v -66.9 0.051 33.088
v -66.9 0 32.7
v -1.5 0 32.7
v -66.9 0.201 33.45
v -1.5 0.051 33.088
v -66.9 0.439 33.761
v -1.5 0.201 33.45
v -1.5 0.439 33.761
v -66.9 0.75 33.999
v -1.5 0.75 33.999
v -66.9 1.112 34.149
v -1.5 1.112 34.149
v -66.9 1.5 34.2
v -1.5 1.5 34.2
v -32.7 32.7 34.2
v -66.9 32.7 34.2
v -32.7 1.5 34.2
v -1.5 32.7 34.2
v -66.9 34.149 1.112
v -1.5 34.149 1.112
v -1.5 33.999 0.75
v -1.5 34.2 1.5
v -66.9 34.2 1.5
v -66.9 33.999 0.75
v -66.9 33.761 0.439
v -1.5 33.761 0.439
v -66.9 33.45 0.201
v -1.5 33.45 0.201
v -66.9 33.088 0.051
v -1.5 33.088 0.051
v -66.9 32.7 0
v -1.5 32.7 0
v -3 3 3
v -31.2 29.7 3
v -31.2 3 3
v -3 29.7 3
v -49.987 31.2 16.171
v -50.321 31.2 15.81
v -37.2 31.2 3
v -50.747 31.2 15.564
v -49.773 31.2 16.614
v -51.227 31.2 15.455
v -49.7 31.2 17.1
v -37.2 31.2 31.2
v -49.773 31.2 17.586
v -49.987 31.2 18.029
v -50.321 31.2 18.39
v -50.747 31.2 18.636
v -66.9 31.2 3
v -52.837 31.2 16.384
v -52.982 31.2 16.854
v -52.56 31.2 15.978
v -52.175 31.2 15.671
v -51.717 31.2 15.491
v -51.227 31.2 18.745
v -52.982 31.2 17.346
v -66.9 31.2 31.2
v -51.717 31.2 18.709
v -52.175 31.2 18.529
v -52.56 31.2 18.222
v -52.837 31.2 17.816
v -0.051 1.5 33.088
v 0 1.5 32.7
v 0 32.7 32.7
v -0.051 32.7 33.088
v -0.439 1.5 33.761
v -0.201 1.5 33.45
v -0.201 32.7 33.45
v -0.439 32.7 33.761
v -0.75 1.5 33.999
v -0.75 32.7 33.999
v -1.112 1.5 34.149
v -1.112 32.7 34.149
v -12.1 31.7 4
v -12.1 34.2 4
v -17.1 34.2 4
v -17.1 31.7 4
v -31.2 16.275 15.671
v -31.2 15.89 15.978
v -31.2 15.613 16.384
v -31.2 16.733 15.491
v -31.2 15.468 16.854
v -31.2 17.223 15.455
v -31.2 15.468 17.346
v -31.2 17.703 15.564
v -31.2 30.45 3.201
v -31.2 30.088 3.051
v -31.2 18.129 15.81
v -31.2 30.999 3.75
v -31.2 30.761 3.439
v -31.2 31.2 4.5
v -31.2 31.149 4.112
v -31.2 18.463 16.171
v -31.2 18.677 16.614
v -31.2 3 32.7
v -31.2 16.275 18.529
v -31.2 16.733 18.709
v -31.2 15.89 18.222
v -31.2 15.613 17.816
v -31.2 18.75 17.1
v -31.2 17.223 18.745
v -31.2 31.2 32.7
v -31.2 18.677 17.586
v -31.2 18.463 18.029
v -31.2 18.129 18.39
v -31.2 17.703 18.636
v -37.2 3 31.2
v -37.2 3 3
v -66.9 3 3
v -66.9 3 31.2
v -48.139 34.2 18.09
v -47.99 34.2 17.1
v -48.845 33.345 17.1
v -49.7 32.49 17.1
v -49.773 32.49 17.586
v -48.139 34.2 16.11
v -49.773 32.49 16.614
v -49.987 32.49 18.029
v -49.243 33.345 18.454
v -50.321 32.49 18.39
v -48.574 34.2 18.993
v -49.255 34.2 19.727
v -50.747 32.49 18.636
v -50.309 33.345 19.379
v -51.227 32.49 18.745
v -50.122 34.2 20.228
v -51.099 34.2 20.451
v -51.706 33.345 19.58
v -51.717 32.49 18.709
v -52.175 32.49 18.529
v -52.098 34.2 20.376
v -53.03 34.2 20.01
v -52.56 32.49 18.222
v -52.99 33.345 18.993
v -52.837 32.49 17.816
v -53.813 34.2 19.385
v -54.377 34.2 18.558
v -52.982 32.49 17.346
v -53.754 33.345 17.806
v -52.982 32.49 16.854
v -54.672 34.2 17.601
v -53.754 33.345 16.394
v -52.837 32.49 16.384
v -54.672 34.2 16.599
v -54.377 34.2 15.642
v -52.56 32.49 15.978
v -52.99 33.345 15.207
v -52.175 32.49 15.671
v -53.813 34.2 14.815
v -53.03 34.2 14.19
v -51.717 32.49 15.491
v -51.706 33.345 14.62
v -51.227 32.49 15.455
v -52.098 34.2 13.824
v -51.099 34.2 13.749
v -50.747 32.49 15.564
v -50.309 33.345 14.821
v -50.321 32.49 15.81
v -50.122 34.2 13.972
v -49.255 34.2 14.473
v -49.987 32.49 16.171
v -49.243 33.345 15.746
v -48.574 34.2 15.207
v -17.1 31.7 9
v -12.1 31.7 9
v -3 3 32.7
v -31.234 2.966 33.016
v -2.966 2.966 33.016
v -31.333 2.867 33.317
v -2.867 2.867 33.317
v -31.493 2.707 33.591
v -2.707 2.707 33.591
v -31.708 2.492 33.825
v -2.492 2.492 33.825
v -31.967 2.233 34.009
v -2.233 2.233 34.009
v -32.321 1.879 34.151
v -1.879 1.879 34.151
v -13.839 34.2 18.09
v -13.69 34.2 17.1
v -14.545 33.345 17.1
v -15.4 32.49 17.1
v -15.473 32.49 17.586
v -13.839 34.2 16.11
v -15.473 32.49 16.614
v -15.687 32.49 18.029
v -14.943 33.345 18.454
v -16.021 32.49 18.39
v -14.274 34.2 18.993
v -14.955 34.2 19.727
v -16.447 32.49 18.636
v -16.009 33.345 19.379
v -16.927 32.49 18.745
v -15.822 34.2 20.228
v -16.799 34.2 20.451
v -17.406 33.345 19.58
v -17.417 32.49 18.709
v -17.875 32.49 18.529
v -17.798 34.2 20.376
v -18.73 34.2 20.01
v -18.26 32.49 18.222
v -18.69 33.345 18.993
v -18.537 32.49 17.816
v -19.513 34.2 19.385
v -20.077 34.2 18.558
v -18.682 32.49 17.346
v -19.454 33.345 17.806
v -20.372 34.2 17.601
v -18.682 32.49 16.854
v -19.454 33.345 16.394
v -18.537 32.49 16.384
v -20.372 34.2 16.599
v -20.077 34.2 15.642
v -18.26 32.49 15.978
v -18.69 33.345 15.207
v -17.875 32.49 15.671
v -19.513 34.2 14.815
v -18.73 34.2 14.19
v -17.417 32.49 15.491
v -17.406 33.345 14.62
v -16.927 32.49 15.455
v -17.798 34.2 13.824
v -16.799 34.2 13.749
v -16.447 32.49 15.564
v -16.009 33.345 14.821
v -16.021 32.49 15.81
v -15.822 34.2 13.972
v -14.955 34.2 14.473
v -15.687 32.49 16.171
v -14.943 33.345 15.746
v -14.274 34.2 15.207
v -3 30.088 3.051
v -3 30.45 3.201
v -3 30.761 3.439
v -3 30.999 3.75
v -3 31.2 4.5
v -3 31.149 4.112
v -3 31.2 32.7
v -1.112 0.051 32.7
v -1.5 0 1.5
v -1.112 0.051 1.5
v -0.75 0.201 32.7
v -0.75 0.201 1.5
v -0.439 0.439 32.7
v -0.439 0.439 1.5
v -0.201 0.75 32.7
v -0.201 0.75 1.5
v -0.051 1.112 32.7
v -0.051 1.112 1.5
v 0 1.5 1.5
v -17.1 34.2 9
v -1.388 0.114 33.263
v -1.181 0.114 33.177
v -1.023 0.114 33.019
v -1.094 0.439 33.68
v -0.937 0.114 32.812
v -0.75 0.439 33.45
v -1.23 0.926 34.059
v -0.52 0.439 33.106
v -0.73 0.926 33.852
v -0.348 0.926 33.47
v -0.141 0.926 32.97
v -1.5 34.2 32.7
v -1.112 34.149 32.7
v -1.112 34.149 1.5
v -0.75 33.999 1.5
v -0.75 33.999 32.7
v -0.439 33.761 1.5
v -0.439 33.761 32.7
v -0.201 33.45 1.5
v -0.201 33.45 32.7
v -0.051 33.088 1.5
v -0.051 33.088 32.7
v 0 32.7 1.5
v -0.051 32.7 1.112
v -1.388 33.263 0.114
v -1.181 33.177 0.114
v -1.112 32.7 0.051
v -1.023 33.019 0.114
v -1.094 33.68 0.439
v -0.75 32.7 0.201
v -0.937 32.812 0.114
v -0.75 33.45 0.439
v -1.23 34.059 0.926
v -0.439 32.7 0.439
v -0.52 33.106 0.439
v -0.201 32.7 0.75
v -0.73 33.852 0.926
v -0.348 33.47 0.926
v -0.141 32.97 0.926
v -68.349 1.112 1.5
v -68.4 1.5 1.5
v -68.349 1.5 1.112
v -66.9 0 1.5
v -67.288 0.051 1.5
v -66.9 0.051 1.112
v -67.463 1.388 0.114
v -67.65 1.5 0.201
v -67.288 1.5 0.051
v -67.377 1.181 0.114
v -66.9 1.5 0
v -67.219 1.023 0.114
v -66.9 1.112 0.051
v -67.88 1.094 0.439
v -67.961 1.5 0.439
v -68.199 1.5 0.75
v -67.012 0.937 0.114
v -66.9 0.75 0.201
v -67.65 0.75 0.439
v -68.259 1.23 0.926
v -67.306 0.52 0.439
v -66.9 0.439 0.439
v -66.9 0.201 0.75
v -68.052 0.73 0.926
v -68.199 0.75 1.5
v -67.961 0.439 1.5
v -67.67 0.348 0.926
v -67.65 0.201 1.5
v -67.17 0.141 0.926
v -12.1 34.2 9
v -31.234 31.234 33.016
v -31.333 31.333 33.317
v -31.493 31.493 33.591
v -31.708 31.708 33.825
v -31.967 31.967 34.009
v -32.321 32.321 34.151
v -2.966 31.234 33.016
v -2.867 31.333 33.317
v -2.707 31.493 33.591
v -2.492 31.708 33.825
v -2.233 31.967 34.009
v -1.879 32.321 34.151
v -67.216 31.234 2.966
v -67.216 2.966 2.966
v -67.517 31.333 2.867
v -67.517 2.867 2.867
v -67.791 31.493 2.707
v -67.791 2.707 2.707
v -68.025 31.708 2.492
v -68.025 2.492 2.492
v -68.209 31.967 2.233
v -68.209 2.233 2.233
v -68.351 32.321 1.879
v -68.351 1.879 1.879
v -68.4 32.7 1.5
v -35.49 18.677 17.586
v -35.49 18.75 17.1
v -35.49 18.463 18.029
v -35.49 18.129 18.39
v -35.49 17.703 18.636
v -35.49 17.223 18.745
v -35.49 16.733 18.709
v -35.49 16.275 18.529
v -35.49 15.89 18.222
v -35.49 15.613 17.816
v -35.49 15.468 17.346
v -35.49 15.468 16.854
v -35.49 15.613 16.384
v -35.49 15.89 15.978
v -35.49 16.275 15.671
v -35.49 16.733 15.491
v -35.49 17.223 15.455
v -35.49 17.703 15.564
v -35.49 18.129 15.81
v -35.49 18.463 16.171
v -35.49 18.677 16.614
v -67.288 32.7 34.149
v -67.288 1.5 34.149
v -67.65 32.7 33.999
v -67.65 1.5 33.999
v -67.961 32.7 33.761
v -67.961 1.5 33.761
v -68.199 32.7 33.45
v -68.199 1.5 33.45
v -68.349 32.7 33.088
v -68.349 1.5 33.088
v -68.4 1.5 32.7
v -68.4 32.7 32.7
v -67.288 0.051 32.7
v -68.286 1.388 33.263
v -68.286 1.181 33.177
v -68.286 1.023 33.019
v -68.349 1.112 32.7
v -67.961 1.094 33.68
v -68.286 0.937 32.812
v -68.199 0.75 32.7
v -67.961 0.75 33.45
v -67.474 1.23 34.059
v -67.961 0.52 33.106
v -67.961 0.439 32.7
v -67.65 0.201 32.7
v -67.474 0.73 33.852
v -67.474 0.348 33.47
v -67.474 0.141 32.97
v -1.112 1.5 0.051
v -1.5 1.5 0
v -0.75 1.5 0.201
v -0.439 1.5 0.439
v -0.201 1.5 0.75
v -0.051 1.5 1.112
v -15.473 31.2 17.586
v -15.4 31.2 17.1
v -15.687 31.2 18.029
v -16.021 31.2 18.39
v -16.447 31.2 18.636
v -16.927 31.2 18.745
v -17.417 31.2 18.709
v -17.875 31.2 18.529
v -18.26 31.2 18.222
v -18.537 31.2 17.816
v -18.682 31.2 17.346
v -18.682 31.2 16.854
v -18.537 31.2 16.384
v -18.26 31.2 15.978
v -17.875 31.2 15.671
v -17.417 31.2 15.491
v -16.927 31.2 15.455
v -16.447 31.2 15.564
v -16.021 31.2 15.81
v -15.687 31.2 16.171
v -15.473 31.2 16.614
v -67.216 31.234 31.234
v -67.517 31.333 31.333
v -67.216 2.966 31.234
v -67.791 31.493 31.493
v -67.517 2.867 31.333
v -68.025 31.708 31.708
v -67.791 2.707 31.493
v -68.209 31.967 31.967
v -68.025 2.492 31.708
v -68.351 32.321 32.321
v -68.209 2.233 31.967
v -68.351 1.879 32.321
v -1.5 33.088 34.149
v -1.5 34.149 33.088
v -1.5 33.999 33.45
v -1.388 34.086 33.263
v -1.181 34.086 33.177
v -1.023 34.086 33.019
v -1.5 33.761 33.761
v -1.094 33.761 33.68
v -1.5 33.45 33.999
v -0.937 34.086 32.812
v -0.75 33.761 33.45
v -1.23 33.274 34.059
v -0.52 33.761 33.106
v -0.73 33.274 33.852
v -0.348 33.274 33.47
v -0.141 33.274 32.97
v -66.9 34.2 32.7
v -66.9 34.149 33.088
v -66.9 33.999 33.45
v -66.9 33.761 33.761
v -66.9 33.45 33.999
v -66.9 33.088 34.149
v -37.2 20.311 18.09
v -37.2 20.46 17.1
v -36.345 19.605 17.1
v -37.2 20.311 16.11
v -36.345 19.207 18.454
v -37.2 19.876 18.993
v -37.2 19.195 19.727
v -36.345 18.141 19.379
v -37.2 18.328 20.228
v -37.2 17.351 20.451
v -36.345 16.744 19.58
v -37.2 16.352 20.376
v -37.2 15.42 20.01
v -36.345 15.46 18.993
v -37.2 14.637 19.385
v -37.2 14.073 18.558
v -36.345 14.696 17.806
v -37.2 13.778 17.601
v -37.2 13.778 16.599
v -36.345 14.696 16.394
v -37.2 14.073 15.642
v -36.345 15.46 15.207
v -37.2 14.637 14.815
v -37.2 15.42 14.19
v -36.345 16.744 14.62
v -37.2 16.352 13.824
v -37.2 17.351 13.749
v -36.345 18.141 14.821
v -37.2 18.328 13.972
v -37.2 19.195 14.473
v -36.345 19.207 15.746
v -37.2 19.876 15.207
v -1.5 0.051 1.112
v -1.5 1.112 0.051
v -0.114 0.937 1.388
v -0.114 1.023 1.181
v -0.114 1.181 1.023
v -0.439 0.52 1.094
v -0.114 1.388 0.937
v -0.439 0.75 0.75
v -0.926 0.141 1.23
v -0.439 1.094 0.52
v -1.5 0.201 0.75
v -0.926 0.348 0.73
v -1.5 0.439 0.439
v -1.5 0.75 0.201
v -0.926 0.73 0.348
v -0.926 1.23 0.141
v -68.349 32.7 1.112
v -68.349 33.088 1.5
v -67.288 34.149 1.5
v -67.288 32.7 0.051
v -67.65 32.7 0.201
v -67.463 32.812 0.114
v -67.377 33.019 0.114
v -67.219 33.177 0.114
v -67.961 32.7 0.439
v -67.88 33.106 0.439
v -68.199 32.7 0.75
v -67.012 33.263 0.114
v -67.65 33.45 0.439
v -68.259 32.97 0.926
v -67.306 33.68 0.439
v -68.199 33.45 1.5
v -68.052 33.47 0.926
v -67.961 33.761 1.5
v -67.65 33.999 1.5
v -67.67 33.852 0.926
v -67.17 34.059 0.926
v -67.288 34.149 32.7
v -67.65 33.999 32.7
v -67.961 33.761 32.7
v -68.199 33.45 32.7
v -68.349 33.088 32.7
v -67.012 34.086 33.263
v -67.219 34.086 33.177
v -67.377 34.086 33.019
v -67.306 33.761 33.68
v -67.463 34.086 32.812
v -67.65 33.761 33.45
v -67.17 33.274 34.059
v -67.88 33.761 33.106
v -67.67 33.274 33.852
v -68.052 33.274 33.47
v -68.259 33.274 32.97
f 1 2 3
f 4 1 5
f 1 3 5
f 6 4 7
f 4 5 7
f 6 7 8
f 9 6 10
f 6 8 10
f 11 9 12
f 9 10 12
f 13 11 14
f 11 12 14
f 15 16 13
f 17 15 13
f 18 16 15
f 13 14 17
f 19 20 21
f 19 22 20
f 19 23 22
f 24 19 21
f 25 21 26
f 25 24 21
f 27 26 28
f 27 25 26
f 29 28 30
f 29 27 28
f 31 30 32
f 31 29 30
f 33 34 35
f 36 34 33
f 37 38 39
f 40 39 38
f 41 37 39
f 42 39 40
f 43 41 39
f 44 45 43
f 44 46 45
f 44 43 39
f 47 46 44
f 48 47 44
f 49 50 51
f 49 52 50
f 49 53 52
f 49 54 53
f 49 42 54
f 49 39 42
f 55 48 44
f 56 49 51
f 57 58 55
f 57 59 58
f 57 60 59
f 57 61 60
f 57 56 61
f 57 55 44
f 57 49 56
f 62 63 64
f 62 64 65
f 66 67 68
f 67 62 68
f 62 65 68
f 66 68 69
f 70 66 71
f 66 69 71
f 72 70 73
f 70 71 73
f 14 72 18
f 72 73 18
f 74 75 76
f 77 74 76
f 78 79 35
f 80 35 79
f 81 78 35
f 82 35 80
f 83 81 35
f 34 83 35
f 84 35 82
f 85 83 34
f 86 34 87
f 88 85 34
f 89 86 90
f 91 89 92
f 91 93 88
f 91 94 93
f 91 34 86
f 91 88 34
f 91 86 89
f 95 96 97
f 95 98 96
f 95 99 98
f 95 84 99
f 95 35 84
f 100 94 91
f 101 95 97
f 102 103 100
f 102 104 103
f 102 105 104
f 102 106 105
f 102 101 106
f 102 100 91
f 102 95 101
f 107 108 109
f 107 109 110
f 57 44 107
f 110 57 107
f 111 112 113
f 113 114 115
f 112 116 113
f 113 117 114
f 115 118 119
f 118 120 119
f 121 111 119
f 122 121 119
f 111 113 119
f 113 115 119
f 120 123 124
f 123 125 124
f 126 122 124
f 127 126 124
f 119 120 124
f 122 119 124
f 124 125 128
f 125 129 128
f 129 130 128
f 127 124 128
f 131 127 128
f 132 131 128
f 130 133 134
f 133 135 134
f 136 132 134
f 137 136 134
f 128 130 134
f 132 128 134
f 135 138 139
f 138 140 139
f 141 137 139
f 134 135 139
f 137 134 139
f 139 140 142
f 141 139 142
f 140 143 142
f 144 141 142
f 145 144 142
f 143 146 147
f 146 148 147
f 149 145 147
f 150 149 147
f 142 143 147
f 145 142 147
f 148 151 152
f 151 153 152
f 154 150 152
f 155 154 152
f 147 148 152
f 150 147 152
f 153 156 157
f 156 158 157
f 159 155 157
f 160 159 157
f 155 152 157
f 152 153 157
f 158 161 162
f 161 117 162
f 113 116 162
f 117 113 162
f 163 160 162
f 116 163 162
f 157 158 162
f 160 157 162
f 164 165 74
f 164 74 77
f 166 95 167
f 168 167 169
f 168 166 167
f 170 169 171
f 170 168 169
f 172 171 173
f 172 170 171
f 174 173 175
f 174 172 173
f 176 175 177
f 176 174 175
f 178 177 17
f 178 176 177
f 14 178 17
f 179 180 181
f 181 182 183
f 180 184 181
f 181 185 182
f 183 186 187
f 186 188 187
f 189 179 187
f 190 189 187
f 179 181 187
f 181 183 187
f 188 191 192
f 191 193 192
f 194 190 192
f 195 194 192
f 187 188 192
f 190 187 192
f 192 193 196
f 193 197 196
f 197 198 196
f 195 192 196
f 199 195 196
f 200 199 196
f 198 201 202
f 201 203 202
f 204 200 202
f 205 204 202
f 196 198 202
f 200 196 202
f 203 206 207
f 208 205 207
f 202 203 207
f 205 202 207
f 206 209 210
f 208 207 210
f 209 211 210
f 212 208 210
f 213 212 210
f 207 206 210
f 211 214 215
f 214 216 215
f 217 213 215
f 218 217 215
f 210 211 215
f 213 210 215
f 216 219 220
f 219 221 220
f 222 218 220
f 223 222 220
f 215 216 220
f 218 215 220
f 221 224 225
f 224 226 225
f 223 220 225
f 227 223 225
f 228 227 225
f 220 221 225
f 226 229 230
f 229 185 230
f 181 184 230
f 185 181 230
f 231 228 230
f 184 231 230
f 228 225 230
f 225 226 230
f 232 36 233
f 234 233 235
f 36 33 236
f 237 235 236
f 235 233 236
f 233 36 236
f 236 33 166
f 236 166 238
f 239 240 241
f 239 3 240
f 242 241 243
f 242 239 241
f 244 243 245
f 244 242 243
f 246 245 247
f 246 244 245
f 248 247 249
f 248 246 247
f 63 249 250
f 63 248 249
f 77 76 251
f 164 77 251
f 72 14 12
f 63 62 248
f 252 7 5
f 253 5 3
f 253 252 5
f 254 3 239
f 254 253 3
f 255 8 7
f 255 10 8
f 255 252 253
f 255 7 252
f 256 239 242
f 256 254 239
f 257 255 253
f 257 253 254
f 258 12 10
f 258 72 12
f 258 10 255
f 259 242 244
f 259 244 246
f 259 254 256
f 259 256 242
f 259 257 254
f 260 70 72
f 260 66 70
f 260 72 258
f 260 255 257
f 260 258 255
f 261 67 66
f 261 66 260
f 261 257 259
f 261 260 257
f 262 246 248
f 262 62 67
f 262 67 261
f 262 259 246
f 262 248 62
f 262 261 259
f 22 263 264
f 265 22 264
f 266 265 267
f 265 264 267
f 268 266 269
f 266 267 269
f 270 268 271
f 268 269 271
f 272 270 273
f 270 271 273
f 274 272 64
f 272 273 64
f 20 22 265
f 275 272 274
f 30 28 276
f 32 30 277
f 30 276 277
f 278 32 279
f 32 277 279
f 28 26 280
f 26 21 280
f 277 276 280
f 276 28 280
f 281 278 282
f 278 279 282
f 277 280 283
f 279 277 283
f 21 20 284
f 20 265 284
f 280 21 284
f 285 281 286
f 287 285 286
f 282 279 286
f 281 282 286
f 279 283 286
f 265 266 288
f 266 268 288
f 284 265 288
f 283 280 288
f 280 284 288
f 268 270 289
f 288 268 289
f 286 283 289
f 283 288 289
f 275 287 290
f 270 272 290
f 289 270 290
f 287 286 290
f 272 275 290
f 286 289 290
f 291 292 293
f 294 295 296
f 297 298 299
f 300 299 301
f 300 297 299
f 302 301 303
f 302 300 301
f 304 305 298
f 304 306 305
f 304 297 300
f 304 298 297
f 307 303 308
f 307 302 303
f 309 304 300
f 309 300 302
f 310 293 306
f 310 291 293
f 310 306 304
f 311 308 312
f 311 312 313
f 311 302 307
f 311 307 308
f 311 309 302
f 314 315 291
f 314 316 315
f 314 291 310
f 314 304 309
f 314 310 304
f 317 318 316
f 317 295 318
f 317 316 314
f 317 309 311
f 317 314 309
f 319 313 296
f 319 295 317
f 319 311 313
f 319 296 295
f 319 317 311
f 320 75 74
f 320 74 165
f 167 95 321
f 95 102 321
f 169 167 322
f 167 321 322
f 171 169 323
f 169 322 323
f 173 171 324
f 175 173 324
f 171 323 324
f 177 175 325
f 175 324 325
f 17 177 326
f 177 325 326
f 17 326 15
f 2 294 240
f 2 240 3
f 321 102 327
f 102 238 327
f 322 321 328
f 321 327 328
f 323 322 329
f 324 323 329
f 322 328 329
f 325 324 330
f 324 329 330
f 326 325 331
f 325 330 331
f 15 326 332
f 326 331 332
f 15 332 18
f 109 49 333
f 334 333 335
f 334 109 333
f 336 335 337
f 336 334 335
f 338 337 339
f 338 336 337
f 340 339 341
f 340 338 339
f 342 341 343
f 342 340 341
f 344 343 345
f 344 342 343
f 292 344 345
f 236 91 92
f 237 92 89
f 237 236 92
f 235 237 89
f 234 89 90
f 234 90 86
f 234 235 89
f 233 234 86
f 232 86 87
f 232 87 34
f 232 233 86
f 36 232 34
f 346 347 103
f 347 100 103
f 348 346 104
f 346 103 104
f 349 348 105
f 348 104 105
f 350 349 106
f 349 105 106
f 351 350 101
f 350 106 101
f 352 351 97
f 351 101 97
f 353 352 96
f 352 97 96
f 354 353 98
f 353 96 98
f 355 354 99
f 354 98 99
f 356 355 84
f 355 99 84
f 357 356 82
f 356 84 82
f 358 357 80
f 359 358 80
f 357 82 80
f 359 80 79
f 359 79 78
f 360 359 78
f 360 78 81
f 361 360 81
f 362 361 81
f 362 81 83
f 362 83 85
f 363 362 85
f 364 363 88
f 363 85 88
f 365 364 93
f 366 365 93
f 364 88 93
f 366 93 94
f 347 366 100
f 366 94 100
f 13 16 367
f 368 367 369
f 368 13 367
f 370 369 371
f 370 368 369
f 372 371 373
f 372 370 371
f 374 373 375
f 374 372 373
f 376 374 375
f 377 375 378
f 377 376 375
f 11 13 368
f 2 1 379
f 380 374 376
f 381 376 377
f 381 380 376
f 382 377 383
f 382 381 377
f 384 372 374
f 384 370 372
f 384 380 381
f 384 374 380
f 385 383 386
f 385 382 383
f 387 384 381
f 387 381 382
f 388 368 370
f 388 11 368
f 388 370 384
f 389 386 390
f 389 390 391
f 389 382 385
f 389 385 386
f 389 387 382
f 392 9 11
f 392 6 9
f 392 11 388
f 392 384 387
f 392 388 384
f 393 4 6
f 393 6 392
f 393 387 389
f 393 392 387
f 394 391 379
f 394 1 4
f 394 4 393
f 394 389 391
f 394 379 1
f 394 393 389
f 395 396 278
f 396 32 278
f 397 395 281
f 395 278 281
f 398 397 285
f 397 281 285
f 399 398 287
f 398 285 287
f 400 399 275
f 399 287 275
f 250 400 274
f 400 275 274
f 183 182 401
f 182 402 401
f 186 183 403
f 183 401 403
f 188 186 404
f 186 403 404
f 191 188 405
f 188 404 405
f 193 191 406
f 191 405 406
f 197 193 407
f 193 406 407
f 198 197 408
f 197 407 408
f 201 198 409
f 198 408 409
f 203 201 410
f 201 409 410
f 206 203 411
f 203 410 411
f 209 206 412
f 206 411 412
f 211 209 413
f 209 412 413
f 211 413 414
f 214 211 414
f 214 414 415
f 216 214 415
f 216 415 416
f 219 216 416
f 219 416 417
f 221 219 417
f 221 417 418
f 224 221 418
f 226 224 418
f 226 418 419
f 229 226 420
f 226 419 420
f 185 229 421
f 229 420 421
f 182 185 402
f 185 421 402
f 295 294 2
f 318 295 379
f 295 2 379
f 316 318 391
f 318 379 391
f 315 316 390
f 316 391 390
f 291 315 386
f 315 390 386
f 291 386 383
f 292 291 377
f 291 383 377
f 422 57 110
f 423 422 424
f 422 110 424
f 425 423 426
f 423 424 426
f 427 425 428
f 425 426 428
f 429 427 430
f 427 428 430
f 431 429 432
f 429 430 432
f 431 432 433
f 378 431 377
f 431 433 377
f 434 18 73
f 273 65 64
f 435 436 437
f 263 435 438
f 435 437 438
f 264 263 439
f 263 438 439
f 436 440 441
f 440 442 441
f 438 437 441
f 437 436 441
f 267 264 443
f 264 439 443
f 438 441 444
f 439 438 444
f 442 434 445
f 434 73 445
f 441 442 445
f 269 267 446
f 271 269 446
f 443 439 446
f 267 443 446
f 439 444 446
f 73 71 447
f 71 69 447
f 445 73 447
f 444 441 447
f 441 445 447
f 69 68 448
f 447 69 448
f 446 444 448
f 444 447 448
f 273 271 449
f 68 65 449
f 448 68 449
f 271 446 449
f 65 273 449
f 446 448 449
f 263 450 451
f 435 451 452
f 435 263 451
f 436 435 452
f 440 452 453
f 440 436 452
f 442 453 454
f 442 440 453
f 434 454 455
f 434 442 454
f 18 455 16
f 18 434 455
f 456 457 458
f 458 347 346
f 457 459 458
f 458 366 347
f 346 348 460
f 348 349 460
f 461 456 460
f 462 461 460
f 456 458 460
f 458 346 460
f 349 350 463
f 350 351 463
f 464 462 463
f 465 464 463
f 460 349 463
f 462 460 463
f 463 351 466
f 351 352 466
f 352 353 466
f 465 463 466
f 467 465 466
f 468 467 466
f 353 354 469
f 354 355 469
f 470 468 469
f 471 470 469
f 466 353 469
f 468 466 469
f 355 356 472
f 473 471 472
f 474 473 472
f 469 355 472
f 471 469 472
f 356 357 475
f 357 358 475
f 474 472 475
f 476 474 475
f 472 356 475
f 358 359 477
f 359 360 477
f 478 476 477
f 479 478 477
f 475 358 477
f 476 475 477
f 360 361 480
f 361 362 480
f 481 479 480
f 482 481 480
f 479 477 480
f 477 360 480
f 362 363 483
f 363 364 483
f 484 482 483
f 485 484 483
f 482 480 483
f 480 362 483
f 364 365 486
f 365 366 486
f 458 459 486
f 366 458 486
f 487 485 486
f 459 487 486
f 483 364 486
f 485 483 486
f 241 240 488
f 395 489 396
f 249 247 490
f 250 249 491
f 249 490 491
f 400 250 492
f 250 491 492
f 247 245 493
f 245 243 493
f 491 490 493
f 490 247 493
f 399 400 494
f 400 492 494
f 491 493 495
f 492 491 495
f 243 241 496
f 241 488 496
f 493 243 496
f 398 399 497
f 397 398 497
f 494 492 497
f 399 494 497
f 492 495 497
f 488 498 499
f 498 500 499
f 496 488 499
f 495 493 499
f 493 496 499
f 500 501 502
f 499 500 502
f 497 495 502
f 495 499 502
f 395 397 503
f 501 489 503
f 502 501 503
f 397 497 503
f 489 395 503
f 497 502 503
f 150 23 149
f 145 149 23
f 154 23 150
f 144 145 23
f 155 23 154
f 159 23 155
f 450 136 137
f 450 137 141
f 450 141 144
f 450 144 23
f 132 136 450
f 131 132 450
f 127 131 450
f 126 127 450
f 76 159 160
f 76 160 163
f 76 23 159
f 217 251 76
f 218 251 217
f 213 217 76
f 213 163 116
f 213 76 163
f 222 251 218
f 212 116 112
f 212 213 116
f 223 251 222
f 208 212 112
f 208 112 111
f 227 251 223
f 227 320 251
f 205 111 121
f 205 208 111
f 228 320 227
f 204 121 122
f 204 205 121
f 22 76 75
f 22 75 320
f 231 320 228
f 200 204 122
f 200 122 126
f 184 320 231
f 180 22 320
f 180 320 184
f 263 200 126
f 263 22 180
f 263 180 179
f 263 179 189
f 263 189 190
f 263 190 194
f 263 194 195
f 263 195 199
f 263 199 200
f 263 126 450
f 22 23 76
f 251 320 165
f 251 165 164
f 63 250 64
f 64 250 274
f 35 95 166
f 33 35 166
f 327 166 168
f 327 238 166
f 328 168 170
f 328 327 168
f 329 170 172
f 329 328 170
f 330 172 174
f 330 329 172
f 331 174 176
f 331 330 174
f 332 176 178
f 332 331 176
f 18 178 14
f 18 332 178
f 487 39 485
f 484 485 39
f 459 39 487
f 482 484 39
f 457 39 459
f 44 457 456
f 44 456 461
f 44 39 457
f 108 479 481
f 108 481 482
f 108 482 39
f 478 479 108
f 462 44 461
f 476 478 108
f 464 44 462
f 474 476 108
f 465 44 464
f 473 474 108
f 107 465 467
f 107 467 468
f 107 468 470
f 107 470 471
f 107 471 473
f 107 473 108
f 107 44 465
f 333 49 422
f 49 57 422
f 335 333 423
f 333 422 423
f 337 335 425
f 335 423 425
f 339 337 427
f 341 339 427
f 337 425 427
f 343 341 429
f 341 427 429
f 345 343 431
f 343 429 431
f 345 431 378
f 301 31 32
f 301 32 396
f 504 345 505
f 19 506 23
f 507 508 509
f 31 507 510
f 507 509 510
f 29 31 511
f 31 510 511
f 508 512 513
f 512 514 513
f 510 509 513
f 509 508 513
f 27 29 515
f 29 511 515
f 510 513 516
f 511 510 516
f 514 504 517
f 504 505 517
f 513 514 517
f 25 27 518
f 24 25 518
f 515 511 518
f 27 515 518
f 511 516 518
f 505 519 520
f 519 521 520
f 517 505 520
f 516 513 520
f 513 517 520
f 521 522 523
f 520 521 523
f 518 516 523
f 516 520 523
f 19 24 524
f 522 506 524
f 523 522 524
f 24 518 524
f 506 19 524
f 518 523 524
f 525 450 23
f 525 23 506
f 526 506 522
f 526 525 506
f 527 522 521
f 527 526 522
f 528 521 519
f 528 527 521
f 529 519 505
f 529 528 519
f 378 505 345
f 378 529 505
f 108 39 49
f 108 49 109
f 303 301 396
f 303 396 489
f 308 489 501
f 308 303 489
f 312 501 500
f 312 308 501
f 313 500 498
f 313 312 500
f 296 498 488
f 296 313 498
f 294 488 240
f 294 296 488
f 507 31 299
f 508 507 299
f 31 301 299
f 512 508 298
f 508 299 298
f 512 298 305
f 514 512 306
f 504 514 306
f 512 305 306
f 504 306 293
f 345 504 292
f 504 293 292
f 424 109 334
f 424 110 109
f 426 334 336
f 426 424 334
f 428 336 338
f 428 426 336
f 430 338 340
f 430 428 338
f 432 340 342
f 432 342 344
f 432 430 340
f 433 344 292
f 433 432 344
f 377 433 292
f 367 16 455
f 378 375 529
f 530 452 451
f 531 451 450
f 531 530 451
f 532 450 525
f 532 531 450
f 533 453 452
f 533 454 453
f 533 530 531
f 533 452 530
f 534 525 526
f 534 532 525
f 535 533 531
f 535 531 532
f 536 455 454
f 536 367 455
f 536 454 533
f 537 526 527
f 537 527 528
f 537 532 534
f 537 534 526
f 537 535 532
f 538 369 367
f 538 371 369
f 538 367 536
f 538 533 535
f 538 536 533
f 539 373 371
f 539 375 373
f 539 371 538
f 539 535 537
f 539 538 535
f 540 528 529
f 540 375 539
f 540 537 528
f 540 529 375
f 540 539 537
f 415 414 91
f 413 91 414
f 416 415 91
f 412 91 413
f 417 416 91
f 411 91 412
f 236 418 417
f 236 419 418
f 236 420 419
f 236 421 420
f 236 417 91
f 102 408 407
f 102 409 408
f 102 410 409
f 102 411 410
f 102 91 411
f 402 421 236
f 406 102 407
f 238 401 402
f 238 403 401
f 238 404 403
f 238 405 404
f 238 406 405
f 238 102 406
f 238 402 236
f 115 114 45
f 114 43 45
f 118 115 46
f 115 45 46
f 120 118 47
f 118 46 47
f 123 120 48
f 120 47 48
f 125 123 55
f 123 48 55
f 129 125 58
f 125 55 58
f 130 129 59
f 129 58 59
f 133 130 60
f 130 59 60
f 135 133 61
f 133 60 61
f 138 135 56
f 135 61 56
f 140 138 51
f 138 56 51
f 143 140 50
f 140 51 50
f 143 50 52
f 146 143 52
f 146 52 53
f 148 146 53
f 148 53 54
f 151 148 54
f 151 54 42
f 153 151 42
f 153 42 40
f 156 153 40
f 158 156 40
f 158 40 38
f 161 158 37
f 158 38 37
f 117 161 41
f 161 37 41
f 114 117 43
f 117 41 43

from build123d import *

# Parameters (mm, degrees)
F1_DEPTH              = 34.2
F2_W                  = 28.2
F2_H                  = 28.2
F3_DEPTH              = 31.2
F4_W                  = 34.2
F4_H                  = 34.2
F5_DEPTH              = 34.2
F6_W                  = 28.2
F6_H                  = 28.2
F7_DEPTH              = 31.2
F10_D                 = 3.3
F10_DEPTH             = 25
F10_CSINK_D           = 6.72
F10_CSINK_ANGLE       = 90
F10_TIP               = 0.9914200214
F10_ON_F9_D           = 3.3
F10_ON_F9_DEPTH       = 25
F10_ON_F9_CSINK_D     = 6.72
F10_ON_F9_CSINK_ANGLE = 90
F10_ON_F9_TIP         = 0.9914200214
F11_R                 = 1.49999
F12_W                 = 5
F12_H                 = 5
F13_DEPTH             = 2.5


# Not quite as in the source:
# - a fillet or chamfer is up to 0.001 mm smaller than in the source, because OpenCascade refuses the exact size
# - a feature names something its author has since deleted; it is built from what else it names


with BuildPart() as f1:
    # F0 (on Top) → F1 (new body)
    with BuildSketch(Plane.XY):
        Polygon((-34.2, 0), (-8, 0), (0, 0), (0, 34.2), (-34.2, 34.2), align=None)
    extrude(amount=F1_DEPTH)

    # F2 (on face) → F3 (cut)
    with BuildSketch(Plane.XY.offset(34.2)):
        with Locations((-17.1, 17.1)):
            Rectangle(F2_W, F2_H)
    extrude(amount=-F3_DEPTH, mode=Mode.SUBTRACT)

    # F4 (on face) → F5 (join)
    with BuildSketch(Plane(origin=(-34.2, 0, 0), x_dir=(0, -1, 0), z_dir=(-1, 0, 0))):
        with Locations((-17.1, 17.1)):
            Rectangle(F4_W, F4_H)
    extrude(amount=F5_DEPTH)

    # F6 (on face) → F7 (cut)
    with BuildSketch(Plane(origin=(-68.4, 0, 0), x_dir=(0, -1, 0), z_dir=(-1, 0, 0))):
        with Locations((-17.1, 17.1)):
            Rectangle(F6_W, F6_H)
    extrude(amount=-F7_DEPTH, mode=Mode.SUBTRACT)

    # F10
    with Locations(Plane(origin=(0, 34.2, 0), x_dir=(-1, 0, 0), z_dir=(0, 1, 0))):
        with Locations((17.05, 17.1), (51.35, 17.1)):
            CounterSinkHole(F10_D / 2, F10_CSINK_D / 2, depth=F10_DEPTH, counter_sink_angle=F10_CSINK_ANGLE)
            with Locations((0, 0, -(F10_DEPTH + F10_TIP / 2))):  # 118° drill point
                Cone(0, F10_D / 2, F10_TIP, mode=Mode.SUBTRACT)

    # F10 on F9
    with Locations(Plane(origin=(-37.2, 0, 0), x_dir=(0, -1, 0), z_dir=(-1, 0, 0))):
        with Locations((-17.1, 17.1)):
            CounterSinkHole(F10_ON_F9_D / 2, F10_ON_F9_CSINK_D / 2, depth=F10_ON_F9_DEPTH, counter_sink_angle=F10_ON_F9_CSINK_ANGLE)
            with Locations((0, 0, -(F10_ON_F9_DEPTH + F10_ON_F9_TIP / 2))):  # 118° drill point
                Cone(0, F10_ON_F9_D / 2, F10_ON_F9_TIP, mode=Mode.SUBTRACT)

    # F11 (radius 1.5 in the source; OpenCascade refuses exactly that, so slightly less here)
    f11_edges = [f1.edges().sort_by_distance(p)[0] for p in [
        (-31.2, 17.1, 34.2),
        (-17.1, 31.2, 34.2),
        (-17.1, 31.2, 3),
        (0, 17.1, 34.2),
        (-34.2, 0, 34.2),
        (-68.4, 17.1, 34.2),
        (-34.2, 34.2, 34.2),
        (0, 34.2, 17.1),
        (-68.4, 17.1, 31.2),
        (-68.4, 0, 17.1),
        (-68.4, 3, 17.1),
        (-68.4, 31.2, 17.1),
        (-68.4, 34.2, 17.1),
        (-68.4, 17.1, 3),
        (-68.4, 17.1, 0),
        (-34.2, 0, 0),
        (-34.2, 34.2, 0),
        (0, 0, 17.1),
        (-3, 17.1, 34.2),
        (-17.1, 3, 34.2),
        (0, 17.1, 0),
    ]]
    fillet(f11_edges, radius=F11_R)

    # F12 (on face) → F13 (cut)
    with BuildSketch(Plane(origin=(0, 34.2, 0), x_dir=(-1, 0, 0), z_dir=(0, 1, 0))):
        with Locations((14.6, 6.5)):
            Rectangle(F12_W, F12_H)
    extrude(amount=-F13_DEPTH, mode=Mode.SUBTRACT)


solid = f1.part
